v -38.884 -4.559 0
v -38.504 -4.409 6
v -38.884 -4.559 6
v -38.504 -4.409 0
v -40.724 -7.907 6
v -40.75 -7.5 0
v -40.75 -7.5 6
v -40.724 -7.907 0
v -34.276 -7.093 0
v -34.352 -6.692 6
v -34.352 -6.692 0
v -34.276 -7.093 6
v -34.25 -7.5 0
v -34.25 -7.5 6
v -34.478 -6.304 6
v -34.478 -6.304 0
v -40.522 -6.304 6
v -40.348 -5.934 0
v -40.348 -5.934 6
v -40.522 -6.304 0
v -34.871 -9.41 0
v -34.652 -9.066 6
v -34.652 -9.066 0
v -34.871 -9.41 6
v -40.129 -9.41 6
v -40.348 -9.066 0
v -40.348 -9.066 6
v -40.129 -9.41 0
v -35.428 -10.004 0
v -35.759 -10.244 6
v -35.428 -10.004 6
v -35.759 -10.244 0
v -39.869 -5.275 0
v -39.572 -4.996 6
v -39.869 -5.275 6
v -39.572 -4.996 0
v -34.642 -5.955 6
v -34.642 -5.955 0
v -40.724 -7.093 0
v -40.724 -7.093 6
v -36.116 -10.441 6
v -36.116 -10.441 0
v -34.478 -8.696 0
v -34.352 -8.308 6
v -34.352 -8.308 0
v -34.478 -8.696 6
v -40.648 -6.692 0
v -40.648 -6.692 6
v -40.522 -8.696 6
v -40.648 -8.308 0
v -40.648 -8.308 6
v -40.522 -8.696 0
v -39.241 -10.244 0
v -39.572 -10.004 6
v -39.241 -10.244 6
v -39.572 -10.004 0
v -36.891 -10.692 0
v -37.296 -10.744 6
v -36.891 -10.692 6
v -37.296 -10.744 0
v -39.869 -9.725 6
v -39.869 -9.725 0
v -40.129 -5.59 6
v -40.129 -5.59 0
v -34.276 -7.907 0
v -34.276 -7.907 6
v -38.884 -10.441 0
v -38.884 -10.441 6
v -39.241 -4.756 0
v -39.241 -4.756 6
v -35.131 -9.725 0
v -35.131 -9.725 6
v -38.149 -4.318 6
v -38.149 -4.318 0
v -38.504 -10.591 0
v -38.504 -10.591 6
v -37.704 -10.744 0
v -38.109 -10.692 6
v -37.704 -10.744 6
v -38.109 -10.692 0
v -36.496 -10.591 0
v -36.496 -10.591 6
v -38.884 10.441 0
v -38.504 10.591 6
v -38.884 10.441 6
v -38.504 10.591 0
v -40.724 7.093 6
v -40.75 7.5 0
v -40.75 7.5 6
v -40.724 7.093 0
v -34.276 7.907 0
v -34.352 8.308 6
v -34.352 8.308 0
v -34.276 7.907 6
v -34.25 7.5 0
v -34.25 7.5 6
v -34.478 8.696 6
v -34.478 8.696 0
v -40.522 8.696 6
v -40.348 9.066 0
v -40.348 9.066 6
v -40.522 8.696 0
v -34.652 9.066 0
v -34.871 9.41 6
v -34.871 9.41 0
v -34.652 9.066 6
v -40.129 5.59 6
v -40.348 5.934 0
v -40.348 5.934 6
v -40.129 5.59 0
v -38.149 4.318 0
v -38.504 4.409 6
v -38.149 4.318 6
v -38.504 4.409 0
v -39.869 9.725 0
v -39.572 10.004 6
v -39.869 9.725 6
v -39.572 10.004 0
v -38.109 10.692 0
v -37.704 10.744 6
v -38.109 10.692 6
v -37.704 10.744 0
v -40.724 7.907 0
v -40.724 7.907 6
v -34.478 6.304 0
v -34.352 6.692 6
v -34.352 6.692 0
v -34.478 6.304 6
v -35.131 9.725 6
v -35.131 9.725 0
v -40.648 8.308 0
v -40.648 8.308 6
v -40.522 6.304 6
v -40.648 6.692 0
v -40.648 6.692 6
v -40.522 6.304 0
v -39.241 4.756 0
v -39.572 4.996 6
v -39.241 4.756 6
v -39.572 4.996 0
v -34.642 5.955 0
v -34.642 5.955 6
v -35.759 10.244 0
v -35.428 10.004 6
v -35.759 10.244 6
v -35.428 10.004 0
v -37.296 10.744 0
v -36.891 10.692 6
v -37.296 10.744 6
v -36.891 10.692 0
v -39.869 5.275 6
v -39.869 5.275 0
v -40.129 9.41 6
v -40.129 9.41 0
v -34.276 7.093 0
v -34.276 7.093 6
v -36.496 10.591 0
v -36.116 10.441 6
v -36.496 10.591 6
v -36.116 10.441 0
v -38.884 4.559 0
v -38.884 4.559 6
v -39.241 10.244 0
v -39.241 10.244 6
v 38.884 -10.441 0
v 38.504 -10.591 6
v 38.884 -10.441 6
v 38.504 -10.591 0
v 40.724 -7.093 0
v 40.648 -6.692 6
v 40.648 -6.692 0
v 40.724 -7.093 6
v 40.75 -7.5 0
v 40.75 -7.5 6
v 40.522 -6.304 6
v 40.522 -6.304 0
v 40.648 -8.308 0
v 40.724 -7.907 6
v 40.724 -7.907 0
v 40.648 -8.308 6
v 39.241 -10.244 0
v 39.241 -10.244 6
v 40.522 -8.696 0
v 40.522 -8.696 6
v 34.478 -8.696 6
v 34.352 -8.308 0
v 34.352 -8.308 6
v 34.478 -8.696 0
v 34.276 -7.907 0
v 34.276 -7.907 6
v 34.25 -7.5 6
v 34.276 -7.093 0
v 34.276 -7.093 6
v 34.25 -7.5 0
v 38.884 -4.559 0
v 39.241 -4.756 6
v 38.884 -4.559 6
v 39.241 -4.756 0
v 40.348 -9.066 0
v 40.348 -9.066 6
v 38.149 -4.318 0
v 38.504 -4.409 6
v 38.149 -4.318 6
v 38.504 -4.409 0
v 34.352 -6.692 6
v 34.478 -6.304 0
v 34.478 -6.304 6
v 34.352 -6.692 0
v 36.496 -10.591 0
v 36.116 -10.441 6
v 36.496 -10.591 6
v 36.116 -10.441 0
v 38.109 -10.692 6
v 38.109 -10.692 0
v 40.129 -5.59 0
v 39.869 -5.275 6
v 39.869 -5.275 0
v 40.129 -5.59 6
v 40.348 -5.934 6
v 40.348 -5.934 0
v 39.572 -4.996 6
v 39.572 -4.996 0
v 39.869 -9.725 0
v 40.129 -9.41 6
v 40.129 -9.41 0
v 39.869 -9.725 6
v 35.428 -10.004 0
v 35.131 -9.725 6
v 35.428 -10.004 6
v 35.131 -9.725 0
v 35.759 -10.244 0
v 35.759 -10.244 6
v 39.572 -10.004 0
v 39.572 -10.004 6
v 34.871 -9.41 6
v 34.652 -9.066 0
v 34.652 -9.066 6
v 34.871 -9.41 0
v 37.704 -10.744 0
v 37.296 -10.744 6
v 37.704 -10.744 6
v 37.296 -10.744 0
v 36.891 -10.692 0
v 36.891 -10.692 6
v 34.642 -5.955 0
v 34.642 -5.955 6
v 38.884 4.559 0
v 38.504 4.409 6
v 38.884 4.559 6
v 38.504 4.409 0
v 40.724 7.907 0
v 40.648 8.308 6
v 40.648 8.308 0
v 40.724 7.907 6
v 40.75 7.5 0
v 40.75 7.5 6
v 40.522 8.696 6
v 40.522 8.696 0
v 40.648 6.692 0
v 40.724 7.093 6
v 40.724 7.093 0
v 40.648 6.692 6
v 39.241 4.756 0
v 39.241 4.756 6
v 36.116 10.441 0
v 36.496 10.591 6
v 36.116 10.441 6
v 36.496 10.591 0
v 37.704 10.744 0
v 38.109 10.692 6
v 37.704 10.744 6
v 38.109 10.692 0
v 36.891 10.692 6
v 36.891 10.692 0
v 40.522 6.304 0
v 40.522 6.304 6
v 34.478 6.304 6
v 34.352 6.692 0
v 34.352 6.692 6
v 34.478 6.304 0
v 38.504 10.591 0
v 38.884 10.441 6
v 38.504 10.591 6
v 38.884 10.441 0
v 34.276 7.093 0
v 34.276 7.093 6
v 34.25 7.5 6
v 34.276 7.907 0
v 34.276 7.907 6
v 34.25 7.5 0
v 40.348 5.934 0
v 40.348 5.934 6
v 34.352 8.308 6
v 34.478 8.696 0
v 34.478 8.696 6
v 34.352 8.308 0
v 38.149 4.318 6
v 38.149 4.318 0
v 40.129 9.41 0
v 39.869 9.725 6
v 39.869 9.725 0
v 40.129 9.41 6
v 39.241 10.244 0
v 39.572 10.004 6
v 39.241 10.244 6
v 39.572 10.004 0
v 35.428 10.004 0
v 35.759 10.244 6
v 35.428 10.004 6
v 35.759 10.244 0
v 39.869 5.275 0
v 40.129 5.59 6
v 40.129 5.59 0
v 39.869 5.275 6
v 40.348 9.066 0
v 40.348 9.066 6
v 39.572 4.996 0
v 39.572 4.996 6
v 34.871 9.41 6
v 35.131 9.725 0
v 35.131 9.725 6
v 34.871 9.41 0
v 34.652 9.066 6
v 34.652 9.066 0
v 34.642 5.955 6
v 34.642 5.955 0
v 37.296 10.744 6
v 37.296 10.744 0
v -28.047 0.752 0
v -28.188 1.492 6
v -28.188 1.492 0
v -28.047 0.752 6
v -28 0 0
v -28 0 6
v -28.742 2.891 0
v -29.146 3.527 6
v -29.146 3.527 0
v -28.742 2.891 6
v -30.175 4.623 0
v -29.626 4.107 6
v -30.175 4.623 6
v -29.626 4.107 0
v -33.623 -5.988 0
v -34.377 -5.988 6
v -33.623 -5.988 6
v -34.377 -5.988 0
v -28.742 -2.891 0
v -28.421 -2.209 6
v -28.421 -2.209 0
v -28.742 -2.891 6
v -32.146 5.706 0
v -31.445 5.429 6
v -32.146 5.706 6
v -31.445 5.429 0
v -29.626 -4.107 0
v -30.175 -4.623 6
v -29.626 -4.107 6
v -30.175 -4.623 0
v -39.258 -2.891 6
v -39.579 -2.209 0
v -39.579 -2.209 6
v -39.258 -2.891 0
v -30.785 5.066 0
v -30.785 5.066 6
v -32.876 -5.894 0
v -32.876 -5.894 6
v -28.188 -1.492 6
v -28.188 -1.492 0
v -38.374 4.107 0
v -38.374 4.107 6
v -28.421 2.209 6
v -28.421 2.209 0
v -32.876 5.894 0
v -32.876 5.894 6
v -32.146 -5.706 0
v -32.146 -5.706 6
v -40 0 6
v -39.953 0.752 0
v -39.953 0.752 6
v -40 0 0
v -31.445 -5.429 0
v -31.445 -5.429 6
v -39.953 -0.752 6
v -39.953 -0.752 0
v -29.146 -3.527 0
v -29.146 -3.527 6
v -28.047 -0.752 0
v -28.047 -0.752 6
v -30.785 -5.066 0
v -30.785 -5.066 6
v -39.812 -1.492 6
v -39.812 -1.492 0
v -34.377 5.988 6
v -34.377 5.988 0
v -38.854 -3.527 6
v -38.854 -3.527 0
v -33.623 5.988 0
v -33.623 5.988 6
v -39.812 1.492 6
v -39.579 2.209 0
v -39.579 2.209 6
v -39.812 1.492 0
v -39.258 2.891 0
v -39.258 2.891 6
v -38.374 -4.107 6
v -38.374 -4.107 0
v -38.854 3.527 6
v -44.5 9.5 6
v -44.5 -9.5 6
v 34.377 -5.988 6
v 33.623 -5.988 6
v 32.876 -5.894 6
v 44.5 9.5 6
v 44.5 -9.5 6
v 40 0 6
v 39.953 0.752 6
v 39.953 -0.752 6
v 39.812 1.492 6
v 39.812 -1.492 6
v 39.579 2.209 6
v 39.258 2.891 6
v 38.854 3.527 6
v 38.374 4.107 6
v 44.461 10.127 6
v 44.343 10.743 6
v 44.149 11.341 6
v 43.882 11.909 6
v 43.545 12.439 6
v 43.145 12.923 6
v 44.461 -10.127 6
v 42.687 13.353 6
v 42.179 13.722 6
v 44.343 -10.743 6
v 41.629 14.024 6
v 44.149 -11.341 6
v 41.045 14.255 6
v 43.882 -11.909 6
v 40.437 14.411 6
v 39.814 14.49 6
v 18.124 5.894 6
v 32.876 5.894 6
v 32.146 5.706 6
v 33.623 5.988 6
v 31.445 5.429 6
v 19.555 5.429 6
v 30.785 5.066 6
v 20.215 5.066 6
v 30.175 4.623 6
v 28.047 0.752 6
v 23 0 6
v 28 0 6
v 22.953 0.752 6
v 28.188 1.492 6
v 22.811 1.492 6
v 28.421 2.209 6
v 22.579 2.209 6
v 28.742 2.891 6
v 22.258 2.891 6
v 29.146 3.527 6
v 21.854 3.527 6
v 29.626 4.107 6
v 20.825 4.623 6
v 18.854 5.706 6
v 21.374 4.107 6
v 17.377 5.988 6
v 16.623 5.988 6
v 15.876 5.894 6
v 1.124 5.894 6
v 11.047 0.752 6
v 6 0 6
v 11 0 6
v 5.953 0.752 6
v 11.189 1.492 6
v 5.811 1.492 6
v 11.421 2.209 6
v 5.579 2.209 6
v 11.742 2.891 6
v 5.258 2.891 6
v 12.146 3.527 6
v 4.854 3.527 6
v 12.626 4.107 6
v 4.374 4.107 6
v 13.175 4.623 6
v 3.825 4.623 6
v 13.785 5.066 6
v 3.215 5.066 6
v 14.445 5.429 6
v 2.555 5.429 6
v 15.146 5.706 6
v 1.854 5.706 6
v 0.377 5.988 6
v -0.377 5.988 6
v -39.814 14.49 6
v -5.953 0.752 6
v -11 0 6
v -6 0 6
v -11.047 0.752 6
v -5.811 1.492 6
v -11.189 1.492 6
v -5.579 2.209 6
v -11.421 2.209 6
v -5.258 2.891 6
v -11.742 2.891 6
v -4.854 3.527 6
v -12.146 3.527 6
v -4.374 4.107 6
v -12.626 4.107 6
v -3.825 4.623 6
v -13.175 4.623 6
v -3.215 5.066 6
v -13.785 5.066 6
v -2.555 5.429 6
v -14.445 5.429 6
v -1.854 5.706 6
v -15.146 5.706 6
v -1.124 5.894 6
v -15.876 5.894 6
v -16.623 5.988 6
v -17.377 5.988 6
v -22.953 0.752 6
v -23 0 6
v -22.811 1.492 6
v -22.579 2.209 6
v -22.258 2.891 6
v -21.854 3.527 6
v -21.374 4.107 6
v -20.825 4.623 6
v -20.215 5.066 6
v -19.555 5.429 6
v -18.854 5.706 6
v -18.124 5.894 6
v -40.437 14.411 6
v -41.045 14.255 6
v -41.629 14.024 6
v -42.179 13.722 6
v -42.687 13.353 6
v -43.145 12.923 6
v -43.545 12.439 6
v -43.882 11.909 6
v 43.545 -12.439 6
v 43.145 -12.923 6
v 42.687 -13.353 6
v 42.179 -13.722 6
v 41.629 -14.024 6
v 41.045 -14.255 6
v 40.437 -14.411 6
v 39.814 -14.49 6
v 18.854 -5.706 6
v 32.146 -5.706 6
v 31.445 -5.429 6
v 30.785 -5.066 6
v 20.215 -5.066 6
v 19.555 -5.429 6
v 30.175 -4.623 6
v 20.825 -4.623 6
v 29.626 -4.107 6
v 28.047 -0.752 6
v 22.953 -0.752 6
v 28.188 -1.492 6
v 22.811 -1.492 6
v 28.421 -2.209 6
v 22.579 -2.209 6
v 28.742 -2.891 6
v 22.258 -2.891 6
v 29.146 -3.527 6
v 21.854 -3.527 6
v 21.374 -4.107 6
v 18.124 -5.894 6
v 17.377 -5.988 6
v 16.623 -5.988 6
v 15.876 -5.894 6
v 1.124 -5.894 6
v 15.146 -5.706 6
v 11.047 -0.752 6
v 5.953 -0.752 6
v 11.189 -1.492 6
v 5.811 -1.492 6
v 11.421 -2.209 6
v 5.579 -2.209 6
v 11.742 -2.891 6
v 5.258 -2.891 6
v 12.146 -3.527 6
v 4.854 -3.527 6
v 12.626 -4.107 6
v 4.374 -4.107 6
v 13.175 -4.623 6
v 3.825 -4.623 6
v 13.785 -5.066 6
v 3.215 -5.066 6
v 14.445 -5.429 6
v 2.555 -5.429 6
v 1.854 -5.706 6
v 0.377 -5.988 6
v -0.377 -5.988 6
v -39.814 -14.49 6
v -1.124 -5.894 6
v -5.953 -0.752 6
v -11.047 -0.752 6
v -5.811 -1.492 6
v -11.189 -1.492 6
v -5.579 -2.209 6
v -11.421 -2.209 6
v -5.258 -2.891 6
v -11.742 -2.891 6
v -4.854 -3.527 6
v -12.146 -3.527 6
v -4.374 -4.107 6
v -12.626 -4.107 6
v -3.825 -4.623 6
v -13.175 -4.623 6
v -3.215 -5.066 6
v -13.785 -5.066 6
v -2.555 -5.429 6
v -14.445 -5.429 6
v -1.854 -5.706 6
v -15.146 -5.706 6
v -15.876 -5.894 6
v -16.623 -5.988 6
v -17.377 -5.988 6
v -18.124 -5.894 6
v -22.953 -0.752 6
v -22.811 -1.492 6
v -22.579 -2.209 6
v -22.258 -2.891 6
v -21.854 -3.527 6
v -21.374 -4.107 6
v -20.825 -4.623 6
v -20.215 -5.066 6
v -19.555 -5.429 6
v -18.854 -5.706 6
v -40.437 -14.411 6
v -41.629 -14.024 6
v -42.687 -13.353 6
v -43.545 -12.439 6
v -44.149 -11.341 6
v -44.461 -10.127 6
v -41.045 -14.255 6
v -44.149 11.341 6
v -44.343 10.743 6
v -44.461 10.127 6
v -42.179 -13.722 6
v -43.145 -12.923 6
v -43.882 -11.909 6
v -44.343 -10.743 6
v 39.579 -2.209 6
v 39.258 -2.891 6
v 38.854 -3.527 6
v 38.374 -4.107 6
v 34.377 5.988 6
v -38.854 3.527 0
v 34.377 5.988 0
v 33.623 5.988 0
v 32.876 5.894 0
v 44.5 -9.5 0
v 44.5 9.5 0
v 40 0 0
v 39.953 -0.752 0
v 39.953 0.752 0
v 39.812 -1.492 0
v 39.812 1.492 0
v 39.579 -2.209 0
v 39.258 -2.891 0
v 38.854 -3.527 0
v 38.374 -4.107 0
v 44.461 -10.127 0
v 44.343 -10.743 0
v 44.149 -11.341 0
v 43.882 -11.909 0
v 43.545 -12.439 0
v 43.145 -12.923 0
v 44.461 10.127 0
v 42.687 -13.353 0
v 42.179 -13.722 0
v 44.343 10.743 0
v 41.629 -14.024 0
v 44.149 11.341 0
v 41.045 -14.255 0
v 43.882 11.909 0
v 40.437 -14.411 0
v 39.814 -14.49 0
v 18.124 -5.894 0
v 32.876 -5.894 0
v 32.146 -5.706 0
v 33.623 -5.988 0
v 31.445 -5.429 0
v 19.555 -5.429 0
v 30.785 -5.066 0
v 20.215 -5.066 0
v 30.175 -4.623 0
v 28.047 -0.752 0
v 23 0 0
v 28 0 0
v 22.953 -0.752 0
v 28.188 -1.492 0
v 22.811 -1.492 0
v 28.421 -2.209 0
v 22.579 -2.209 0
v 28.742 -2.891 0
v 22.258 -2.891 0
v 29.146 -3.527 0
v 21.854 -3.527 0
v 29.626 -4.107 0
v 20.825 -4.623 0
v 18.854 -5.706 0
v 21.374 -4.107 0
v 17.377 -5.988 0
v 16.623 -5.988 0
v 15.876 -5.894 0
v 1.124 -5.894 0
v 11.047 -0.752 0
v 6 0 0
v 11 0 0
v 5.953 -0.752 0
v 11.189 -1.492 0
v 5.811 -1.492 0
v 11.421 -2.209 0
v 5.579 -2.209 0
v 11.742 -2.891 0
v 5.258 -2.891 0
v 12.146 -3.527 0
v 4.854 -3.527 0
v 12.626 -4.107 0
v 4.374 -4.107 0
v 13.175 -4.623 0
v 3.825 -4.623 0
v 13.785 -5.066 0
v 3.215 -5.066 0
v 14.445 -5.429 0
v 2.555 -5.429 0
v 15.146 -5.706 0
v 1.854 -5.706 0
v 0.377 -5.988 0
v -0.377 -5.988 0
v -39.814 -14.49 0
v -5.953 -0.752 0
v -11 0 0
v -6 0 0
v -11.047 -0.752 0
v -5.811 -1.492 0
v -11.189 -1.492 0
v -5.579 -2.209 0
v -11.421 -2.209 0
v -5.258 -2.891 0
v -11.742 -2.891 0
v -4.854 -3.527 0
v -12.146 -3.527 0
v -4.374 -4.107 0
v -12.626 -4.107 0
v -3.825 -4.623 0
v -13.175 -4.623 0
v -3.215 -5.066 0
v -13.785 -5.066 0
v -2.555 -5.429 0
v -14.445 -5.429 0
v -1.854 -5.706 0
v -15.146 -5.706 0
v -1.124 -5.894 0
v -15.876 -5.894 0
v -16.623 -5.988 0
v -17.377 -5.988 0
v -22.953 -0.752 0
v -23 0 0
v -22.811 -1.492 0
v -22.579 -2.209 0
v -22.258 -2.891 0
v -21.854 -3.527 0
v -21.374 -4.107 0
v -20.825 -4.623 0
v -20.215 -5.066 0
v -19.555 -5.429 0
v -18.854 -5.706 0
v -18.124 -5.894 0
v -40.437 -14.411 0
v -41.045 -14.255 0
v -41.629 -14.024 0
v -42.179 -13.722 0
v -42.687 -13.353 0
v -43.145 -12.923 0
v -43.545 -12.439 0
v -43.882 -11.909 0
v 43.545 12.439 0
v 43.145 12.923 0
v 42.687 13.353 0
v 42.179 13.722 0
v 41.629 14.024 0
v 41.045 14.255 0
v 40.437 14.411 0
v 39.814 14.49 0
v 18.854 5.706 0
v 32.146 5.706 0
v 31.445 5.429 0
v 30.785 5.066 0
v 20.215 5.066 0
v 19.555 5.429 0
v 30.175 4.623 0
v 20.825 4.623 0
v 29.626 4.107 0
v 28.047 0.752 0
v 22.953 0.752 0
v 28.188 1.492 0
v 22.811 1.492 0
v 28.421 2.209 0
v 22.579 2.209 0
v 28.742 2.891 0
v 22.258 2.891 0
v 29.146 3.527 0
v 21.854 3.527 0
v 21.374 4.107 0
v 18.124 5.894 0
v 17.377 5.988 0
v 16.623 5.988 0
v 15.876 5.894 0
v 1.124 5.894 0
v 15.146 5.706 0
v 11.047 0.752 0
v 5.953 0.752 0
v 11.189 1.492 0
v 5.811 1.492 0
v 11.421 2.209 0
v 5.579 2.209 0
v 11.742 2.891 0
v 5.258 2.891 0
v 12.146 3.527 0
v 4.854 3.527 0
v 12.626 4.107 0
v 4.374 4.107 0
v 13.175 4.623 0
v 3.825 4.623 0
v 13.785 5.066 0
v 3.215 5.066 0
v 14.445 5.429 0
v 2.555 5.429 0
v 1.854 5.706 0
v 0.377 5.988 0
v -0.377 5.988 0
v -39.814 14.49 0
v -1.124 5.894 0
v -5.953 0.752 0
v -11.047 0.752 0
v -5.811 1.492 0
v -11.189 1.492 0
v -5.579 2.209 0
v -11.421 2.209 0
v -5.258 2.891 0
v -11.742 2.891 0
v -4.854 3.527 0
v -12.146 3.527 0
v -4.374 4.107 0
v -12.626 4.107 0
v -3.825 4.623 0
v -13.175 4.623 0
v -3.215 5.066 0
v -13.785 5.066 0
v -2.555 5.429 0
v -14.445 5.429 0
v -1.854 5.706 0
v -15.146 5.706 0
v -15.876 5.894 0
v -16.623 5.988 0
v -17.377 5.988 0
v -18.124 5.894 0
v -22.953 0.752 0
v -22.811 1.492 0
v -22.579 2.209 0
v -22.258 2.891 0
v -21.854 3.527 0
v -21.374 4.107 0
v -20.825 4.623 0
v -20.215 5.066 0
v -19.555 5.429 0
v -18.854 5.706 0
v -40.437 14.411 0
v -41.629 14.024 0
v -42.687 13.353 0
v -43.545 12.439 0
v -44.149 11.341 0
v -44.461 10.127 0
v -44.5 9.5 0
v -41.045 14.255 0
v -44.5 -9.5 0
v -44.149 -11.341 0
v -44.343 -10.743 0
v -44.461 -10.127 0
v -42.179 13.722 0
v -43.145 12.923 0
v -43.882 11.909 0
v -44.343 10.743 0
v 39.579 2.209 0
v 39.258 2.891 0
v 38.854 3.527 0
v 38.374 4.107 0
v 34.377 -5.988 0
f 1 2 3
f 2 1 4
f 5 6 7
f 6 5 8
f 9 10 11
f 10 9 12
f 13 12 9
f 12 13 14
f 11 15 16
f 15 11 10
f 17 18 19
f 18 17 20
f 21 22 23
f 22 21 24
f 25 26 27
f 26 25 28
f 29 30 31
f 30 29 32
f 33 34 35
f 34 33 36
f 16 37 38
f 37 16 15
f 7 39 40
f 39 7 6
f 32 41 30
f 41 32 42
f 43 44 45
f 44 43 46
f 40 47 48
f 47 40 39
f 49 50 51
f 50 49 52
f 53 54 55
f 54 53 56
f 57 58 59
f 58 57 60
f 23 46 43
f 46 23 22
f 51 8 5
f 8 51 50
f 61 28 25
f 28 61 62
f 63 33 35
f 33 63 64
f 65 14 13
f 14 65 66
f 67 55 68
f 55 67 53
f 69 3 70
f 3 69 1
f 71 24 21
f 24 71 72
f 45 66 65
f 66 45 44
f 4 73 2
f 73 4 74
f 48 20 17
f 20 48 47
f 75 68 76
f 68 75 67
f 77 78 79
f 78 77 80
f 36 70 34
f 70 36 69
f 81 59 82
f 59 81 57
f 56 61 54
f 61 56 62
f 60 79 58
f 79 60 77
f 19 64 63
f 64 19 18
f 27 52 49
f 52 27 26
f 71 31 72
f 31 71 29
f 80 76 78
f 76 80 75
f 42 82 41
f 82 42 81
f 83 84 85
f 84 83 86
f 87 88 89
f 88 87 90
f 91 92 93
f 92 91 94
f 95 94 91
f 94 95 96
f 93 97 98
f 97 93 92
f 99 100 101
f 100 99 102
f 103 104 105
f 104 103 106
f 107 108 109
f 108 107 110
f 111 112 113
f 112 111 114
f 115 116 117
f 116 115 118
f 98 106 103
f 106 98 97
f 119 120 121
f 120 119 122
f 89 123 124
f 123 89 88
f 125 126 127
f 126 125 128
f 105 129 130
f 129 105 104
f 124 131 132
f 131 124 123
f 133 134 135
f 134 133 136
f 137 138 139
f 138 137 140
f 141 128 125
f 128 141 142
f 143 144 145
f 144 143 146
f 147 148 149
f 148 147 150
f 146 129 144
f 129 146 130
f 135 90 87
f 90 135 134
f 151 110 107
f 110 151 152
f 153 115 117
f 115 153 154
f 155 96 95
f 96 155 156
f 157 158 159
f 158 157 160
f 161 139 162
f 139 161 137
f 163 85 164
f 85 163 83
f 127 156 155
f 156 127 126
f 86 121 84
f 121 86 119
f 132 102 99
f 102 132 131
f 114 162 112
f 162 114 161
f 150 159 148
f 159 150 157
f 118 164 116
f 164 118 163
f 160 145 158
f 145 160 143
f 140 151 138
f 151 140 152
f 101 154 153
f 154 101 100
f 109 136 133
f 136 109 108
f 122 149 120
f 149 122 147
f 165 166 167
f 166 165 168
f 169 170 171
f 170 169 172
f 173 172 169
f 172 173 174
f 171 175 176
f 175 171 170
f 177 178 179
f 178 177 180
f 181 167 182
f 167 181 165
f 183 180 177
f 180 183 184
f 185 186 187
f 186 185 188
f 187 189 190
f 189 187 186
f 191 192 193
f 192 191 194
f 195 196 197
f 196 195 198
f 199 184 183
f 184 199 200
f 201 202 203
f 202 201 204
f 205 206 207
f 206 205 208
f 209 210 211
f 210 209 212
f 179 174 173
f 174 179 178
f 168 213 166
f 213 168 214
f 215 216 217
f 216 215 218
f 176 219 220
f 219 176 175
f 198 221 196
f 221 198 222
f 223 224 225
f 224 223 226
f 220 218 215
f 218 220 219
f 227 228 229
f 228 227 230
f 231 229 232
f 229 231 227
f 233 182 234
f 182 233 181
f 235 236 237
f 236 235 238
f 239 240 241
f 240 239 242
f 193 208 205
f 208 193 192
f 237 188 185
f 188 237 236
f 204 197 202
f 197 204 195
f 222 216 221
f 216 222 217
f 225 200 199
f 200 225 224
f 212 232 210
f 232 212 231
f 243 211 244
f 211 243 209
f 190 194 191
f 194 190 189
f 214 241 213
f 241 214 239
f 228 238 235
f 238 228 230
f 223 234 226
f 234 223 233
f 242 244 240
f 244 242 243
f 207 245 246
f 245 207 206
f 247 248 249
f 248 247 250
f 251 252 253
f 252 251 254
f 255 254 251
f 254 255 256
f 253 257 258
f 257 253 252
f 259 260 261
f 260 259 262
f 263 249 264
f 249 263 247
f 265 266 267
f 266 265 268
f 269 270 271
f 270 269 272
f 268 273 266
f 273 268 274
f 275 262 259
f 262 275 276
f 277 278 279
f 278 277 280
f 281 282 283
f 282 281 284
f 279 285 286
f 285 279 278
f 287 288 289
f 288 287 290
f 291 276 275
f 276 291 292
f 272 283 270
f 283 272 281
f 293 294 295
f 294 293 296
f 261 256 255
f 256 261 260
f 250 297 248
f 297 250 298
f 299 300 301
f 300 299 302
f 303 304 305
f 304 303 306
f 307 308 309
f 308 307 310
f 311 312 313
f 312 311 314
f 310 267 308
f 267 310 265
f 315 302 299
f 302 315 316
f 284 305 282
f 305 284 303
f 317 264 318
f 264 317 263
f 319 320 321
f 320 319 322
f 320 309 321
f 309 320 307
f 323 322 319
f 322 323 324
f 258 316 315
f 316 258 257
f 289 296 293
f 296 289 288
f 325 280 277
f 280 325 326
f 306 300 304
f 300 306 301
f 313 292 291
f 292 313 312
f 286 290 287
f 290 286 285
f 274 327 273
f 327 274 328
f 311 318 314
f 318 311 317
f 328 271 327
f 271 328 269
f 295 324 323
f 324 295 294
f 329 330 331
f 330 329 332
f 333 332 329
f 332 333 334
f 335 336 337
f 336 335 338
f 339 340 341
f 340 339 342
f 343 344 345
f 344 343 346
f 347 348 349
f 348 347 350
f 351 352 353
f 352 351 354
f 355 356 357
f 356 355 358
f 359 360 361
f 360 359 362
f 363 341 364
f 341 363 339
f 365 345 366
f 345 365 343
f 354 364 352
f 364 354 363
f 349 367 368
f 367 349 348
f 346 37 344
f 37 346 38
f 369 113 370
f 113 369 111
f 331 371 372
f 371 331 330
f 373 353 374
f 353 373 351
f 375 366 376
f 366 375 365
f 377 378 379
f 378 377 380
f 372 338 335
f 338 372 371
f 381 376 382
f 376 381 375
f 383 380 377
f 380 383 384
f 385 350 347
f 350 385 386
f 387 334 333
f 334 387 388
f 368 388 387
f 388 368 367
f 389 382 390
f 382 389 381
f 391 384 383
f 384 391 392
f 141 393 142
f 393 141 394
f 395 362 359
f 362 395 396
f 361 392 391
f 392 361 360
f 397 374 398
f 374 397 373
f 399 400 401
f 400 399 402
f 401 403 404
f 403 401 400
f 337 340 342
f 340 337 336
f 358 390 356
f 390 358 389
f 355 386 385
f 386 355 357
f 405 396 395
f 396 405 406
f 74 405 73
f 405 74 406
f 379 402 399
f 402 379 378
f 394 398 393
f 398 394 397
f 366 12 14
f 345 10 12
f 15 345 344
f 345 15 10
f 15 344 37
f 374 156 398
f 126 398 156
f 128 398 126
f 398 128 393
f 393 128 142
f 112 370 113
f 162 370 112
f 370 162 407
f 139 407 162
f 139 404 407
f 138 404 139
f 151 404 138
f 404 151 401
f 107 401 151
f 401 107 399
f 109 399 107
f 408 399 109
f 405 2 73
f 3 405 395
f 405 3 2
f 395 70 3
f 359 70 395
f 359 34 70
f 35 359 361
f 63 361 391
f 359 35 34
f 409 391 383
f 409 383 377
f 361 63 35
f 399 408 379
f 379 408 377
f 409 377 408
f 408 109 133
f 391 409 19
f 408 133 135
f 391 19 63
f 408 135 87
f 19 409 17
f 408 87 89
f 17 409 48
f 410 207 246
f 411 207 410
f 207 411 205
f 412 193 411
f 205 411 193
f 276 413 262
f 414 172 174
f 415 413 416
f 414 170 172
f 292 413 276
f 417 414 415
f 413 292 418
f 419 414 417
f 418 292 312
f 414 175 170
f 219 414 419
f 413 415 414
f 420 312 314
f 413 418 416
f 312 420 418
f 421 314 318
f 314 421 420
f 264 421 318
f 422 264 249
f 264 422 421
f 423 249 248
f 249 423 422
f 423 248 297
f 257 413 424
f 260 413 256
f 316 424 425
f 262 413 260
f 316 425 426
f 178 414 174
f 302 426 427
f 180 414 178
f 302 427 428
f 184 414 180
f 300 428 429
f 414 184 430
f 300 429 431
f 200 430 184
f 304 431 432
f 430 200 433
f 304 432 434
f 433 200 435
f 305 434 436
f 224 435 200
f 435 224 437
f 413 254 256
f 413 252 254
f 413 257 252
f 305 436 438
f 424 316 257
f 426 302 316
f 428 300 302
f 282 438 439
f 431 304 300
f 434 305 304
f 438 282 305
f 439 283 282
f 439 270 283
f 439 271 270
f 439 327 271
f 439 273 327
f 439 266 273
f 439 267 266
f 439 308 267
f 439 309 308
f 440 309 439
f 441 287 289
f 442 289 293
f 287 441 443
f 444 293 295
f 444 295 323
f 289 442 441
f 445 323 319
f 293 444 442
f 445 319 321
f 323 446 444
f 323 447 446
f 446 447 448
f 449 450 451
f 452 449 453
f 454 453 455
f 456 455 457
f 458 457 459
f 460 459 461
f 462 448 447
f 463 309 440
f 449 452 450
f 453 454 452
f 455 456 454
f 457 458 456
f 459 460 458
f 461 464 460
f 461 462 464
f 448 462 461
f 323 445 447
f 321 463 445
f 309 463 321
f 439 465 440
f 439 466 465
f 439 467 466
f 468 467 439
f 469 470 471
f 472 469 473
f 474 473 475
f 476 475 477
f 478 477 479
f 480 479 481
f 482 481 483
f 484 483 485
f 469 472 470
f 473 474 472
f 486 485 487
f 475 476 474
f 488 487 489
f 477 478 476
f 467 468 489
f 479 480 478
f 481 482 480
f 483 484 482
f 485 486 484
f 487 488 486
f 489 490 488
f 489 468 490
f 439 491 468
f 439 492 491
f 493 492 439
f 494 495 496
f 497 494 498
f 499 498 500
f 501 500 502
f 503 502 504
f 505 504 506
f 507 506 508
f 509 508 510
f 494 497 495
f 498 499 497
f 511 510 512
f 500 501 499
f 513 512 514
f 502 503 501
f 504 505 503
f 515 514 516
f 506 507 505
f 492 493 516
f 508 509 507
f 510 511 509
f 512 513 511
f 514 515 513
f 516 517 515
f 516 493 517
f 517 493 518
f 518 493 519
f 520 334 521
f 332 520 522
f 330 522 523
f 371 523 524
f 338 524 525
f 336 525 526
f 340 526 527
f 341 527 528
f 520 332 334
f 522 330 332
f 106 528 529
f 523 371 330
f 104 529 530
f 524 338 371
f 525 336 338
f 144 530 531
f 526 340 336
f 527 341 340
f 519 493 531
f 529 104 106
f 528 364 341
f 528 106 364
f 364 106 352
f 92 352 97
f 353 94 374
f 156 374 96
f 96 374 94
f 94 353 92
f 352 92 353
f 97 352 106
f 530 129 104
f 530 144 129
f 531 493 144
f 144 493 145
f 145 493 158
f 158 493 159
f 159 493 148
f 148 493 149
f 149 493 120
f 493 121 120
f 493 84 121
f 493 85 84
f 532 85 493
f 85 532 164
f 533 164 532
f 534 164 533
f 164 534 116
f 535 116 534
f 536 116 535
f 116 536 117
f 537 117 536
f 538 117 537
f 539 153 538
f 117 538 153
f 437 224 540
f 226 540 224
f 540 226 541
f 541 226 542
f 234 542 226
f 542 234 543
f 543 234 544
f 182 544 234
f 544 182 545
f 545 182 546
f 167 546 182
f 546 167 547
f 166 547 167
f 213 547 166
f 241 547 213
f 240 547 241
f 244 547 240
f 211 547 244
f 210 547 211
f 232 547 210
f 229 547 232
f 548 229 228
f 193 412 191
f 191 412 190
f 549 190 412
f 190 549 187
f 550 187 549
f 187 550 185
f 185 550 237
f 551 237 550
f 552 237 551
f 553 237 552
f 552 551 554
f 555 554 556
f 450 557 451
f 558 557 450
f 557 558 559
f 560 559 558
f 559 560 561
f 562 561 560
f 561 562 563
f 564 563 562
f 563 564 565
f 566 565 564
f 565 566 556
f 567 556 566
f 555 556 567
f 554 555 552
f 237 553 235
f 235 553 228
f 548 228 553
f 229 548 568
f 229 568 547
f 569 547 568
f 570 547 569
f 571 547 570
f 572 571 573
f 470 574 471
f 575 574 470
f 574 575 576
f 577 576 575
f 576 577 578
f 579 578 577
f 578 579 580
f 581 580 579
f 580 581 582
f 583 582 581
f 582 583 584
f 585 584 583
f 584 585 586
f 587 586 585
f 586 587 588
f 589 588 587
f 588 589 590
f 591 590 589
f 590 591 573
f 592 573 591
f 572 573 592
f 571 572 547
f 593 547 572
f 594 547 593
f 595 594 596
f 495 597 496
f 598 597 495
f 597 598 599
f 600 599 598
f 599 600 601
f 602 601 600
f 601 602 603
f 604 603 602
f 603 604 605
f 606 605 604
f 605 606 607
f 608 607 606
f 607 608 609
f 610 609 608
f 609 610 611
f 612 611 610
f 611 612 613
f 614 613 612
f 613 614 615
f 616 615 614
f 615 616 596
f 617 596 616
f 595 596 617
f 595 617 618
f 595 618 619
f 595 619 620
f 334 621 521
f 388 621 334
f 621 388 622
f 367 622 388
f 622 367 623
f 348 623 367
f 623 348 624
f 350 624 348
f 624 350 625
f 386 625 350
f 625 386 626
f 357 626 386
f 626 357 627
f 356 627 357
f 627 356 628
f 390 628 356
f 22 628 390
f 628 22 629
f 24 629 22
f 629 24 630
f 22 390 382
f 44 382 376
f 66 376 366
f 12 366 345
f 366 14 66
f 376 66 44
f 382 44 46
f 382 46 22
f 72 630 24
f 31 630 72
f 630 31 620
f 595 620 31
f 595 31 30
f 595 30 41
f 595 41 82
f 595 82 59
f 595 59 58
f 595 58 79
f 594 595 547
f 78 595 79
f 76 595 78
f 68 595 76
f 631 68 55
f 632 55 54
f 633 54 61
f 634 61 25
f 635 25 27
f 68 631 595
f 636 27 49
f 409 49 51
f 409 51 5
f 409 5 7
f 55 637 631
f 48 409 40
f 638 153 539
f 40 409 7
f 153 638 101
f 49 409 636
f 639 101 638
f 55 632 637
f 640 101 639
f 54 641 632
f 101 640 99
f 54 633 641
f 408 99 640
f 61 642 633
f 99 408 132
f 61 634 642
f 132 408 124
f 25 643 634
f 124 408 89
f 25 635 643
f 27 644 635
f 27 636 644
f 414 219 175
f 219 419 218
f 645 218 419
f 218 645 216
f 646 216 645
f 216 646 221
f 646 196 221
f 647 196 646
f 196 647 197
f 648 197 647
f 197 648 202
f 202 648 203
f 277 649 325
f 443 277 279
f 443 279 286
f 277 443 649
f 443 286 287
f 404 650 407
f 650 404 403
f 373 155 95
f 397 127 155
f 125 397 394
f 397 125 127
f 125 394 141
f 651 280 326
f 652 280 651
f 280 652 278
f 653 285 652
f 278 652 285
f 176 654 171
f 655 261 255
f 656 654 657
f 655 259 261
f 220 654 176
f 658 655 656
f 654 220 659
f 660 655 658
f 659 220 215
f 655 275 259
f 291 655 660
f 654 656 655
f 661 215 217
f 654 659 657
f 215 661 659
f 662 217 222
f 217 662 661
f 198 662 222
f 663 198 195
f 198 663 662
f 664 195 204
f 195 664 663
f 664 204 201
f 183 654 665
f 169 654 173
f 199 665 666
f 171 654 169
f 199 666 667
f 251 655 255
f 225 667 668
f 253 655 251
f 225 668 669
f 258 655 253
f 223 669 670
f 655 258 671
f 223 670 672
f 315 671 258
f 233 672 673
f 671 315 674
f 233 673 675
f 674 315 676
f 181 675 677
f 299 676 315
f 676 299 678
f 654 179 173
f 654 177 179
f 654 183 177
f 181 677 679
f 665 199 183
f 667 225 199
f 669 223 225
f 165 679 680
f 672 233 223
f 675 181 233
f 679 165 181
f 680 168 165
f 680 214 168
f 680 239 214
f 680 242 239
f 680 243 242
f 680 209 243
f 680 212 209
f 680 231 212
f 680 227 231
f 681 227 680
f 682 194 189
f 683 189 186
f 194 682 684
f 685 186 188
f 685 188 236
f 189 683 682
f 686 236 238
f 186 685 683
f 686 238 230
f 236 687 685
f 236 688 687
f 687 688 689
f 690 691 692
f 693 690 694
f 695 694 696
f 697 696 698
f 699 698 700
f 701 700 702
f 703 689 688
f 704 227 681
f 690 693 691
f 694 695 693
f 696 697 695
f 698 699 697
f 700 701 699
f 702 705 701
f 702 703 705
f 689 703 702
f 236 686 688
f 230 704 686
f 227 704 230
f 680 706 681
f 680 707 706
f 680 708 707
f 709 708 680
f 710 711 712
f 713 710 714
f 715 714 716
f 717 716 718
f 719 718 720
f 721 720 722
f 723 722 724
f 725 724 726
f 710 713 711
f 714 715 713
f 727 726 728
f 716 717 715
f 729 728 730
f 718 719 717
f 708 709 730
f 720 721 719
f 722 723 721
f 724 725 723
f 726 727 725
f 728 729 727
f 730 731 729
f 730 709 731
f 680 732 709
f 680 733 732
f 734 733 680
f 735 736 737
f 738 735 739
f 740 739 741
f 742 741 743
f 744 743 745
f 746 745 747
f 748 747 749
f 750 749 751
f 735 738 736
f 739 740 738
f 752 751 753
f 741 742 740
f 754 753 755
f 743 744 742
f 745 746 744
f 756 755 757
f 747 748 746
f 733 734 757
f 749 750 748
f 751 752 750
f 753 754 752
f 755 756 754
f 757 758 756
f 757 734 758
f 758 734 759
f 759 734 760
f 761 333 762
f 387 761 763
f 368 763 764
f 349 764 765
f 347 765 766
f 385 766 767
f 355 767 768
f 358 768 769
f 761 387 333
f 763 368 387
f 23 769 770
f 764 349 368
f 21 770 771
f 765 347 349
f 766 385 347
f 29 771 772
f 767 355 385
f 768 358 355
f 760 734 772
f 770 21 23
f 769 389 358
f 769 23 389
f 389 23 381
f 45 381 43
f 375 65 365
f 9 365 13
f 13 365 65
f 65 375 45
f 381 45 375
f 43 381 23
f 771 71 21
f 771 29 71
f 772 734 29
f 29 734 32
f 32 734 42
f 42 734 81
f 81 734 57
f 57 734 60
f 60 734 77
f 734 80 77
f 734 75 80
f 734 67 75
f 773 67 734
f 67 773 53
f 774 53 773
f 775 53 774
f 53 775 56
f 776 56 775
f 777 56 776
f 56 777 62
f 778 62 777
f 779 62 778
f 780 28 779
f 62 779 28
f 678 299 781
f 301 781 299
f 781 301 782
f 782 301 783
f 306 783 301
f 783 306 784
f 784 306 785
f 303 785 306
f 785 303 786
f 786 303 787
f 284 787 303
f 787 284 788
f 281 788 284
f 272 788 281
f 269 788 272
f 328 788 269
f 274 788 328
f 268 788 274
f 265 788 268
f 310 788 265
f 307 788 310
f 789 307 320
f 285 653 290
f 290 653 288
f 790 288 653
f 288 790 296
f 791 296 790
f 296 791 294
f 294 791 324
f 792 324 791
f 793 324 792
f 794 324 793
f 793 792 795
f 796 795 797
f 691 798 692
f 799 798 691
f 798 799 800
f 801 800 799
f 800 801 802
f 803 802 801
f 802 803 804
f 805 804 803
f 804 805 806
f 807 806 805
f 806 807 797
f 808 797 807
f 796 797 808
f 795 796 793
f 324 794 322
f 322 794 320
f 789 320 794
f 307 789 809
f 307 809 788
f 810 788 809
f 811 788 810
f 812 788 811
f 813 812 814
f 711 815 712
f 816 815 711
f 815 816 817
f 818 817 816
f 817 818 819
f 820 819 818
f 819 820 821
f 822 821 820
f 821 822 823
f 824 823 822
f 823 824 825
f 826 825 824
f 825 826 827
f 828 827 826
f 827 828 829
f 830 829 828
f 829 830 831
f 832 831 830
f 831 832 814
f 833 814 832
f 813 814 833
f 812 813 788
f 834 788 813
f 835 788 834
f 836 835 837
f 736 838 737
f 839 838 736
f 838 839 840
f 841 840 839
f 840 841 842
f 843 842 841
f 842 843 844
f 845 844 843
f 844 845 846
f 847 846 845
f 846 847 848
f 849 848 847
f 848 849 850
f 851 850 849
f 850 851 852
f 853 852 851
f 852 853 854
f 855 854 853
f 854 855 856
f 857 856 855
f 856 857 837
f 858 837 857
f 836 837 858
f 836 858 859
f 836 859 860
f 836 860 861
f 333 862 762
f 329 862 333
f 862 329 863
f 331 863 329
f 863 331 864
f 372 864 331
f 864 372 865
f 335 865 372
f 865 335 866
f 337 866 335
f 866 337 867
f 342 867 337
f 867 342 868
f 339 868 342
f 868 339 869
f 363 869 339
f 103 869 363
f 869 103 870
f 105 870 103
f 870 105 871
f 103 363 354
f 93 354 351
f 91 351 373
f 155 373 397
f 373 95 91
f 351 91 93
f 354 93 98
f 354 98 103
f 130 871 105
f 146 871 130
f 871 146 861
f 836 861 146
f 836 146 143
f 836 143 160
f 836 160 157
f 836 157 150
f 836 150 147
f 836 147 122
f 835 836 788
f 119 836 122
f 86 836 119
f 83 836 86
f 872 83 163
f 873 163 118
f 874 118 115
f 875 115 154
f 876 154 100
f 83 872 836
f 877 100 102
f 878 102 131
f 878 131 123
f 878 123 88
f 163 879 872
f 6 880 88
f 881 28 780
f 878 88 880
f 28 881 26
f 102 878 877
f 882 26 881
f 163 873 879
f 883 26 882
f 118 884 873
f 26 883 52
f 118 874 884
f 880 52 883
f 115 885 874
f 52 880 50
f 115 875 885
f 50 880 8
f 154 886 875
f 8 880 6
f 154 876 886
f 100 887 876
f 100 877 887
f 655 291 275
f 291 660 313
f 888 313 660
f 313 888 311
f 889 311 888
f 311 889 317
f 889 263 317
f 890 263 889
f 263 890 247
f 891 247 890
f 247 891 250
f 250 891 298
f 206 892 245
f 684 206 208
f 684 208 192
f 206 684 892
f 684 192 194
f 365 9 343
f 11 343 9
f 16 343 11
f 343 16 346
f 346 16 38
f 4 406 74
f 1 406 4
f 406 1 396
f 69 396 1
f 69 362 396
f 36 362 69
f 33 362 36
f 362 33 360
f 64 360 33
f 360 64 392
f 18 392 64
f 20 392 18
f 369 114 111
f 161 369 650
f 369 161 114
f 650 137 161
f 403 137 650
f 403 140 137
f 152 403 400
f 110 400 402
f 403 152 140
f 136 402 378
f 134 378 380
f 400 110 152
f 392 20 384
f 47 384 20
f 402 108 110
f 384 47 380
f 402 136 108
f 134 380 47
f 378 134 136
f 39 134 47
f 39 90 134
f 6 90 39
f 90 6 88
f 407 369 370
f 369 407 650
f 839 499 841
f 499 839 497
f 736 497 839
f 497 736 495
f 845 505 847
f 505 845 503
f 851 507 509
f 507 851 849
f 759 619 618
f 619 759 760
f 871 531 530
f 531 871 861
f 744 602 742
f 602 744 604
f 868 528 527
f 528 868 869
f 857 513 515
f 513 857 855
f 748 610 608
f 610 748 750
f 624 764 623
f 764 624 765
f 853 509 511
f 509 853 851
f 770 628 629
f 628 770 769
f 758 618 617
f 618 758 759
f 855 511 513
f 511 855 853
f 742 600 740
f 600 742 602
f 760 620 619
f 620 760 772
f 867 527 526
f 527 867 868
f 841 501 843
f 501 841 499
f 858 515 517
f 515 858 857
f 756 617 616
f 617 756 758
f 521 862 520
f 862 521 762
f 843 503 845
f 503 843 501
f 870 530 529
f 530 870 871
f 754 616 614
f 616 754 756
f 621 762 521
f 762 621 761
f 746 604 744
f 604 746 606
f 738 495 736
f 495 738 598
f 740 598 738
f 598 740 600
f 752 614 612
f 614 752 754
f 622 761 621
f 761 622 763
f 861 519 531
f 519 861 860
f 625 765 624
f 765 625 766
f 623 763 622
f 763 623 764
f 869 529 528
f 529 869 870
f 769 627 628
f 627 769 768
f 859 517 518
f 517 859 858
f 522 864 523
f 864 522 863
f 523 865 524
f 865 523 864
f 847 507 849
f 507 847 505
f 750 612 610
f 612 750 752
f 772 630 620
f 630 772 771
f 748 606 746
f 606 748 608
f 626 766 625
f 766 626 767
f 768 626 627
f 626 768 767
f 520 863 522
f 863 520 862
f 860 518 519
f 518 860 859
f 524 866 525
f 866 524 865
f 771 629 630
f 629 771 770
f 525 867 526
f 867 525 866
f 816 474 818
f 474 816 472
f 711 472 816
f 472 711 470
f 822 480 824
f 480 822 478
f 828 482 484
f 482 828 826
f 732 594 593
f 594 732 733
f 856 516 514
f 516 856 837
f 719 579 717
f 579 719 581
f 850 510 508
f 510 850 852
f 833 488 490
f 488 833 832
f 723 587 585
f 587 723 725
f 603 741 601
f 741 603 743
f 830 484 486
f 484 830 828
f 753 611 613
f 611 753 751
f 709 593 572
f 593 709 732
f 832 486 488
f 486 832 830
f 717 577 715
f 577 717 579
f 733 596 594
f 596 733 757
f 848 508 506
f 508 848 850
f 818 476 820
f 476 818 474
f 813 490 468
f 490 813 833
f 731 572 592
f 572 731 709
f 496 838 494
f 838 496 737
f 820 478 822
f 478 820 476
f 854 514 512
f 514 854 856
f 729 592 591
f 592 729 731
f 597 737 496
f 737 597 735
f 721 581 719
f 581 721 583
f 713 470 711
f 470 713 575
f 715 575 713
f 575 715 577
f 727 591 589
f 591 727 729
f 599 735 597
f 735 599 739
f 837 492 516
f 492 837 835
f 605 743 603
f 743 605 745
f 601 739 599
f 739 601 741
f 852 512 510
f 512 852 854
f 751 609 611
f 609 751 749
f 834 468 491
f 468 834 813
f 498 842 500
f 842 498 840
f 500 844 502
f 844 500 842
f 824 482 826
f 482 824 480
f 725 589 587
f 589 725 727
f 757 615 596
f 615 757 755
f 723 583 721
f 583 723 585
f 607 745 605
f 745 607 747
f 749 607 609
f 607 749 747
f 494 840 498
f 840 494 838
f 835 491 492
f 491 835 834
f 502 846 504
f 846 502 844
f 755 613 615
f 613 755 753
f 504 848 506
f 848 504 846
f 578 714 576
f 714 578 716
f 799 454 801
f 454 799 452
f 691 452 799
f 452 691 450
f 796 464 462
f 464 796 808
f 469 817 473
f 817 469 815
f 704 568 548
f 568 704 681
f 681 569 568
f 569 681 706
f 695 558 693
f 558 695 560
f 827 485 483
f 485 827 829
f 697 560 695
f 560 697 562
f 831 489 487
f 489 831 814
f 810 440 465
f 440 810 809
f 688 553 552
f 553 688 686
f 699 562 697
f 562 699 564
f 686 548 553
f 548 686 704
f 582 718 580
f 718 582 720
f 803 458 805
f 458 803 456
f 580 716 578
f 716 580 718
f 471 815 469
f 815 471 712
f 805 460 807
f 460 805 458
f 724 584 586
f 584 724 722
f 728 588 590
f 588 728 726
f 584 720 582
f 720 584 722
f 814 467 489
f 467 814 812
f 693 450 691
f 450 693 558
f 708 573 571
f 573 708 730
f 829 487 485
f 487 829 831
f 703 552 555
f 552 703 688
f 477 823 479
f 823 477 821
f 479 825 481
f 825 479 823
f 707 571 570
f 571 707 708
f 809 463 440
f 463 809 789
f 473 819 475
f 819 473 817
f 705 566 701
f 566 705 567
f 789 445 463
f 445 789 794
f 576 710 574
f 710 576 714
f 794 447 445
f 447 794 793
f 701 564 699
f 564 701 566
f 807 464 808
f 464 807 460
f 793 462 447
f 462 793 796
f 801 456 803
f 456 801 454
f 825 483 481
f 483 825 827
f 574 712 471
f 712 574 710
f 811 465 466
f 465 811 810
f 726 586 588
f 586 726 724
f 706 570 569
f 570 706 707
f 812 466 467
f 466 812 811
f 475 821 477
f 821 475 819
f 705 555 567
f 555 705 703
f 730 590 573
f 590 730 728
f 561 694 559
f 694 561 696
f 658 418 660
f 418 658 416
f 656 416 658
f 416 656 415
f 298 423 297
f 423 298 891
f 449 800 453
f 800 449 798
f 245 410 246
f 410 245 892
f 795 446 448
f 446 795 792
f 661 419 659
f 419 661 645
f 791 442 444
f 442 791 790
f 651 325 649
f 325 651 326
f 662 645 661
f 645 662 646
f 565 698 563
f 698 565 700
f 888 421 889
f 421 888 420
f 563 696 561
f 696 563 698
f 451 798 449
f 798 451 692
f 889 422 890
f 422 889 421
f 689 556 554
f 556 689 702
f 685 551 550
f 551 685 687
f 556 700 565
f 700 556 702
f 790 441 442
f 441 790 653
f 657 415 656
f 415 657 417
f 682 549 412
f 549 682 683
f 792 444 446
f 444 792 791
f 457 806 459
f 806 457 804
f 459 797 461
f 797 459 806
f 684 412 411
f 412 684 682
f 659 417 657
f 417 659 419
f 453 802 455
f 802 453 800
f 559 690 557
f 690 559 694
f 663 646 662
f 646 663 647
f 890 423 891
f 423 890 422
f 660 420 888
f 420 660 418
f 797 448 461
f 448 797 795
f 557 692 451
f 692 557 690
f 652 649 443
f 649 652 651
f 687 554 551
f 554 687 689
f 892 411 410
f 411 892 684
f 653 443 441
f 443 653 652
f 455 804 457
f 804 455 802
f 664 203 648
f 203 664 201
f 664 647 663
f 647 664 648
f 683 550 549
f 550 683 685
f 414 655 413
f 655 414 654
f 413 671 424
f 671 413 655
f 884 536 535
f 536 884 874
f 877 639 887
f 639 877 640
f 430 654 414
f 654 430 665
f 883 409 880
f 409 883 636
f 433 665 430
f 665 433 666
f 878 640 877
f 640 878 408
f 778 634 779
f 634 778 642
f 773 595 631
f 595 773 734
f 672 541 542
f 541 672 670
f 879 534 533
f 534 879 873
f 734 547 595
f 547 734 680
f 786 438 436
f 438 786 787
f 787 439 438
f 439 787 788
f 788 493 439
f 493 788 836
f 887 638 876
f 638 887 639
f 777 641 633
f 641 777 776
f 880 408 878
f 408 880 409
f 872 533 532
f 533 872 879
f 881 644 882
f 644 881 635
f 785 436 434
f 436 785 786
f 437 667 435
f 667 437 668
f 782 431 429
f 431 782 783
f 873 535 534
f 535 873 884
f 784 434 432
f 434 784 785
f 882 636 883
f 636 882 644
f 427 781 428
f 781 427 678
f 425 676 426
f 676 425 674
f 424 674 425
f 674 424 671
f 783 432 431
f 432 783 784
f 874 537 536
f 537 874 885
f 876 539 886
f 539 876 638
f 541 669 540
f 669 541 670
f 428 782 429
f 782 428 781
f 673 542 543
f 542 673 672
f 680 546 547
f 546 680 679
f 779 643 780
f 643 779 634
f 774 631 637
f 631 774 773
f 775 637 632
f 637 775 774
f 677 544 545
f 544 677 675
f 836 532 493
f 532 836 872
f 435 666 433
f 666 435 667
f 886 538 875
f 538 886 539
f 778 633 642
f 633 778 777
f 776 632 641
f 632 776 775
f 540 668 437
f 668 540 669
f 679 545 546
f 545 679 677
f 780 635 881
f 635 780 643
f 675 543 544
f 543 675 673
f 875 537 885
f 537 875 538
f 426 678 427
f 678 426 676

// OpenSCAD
$fn = 50;


difference() {
	union() {
		hull() {
			translate(v = [-39.5000000000, 9.5000000000, 0]) {
				cylinder(h = 6, r = 5);
			}
			translate(v = [39.5000000000, 9.5000000000, 0]) {
				cylinder(h = 6, r = 5);
			}
			translate(v = [-39.5000000000, -9.5000000000, 0]) {
				cylinder(h = 6, r = 5);
			}
			translate(v = [39.5000000000, -9.5000000000, 0]) {
				cylinder(h = 6, r = 5);
			}
		}
	}
	union() {
		#translate(v = [-37.5000000000, -7.5000000000, -100.0000000000]) {
			cylinder(h = 200, r = 3.2500000000);
		}
		#translate(v = [-37.5000000000, 7.5000000000, -100.0000000000]) {
			cylinder(h = 200, r = 3.2500000000);
		}
		#translate(v = [37.5000000000, -7.5000000000, -100.0000000000]) {
			cylinder(h = 200, r = 3.2500000000);
		}
		#translate(v = [37.5000000000, 7.5000000000, -100.0000000000]) {
			cylinder(h = 200, r = 3.2500000000);
		}
		#translate(v = [-34.0000000000, 0, 0]) {
			cylinder(h = 6, r = 6.0000000000);
		}
		#translate(v = [-17.0000000000, 0, 0]) {
			cylinder(h = 6, r = 6.0000000000);
		}
		#cylinder(h = 6, r = 6.0000000000);
		#translate(v = [17.0000000000, 0, 0]) {
			cylinder(h = 6, r = 6.0000000000);
		}
		#translate(v = [34.0000000000, 0, 0]) {
			cylinder(h = 6, r = 6.0000000000);
		}
	}
}
